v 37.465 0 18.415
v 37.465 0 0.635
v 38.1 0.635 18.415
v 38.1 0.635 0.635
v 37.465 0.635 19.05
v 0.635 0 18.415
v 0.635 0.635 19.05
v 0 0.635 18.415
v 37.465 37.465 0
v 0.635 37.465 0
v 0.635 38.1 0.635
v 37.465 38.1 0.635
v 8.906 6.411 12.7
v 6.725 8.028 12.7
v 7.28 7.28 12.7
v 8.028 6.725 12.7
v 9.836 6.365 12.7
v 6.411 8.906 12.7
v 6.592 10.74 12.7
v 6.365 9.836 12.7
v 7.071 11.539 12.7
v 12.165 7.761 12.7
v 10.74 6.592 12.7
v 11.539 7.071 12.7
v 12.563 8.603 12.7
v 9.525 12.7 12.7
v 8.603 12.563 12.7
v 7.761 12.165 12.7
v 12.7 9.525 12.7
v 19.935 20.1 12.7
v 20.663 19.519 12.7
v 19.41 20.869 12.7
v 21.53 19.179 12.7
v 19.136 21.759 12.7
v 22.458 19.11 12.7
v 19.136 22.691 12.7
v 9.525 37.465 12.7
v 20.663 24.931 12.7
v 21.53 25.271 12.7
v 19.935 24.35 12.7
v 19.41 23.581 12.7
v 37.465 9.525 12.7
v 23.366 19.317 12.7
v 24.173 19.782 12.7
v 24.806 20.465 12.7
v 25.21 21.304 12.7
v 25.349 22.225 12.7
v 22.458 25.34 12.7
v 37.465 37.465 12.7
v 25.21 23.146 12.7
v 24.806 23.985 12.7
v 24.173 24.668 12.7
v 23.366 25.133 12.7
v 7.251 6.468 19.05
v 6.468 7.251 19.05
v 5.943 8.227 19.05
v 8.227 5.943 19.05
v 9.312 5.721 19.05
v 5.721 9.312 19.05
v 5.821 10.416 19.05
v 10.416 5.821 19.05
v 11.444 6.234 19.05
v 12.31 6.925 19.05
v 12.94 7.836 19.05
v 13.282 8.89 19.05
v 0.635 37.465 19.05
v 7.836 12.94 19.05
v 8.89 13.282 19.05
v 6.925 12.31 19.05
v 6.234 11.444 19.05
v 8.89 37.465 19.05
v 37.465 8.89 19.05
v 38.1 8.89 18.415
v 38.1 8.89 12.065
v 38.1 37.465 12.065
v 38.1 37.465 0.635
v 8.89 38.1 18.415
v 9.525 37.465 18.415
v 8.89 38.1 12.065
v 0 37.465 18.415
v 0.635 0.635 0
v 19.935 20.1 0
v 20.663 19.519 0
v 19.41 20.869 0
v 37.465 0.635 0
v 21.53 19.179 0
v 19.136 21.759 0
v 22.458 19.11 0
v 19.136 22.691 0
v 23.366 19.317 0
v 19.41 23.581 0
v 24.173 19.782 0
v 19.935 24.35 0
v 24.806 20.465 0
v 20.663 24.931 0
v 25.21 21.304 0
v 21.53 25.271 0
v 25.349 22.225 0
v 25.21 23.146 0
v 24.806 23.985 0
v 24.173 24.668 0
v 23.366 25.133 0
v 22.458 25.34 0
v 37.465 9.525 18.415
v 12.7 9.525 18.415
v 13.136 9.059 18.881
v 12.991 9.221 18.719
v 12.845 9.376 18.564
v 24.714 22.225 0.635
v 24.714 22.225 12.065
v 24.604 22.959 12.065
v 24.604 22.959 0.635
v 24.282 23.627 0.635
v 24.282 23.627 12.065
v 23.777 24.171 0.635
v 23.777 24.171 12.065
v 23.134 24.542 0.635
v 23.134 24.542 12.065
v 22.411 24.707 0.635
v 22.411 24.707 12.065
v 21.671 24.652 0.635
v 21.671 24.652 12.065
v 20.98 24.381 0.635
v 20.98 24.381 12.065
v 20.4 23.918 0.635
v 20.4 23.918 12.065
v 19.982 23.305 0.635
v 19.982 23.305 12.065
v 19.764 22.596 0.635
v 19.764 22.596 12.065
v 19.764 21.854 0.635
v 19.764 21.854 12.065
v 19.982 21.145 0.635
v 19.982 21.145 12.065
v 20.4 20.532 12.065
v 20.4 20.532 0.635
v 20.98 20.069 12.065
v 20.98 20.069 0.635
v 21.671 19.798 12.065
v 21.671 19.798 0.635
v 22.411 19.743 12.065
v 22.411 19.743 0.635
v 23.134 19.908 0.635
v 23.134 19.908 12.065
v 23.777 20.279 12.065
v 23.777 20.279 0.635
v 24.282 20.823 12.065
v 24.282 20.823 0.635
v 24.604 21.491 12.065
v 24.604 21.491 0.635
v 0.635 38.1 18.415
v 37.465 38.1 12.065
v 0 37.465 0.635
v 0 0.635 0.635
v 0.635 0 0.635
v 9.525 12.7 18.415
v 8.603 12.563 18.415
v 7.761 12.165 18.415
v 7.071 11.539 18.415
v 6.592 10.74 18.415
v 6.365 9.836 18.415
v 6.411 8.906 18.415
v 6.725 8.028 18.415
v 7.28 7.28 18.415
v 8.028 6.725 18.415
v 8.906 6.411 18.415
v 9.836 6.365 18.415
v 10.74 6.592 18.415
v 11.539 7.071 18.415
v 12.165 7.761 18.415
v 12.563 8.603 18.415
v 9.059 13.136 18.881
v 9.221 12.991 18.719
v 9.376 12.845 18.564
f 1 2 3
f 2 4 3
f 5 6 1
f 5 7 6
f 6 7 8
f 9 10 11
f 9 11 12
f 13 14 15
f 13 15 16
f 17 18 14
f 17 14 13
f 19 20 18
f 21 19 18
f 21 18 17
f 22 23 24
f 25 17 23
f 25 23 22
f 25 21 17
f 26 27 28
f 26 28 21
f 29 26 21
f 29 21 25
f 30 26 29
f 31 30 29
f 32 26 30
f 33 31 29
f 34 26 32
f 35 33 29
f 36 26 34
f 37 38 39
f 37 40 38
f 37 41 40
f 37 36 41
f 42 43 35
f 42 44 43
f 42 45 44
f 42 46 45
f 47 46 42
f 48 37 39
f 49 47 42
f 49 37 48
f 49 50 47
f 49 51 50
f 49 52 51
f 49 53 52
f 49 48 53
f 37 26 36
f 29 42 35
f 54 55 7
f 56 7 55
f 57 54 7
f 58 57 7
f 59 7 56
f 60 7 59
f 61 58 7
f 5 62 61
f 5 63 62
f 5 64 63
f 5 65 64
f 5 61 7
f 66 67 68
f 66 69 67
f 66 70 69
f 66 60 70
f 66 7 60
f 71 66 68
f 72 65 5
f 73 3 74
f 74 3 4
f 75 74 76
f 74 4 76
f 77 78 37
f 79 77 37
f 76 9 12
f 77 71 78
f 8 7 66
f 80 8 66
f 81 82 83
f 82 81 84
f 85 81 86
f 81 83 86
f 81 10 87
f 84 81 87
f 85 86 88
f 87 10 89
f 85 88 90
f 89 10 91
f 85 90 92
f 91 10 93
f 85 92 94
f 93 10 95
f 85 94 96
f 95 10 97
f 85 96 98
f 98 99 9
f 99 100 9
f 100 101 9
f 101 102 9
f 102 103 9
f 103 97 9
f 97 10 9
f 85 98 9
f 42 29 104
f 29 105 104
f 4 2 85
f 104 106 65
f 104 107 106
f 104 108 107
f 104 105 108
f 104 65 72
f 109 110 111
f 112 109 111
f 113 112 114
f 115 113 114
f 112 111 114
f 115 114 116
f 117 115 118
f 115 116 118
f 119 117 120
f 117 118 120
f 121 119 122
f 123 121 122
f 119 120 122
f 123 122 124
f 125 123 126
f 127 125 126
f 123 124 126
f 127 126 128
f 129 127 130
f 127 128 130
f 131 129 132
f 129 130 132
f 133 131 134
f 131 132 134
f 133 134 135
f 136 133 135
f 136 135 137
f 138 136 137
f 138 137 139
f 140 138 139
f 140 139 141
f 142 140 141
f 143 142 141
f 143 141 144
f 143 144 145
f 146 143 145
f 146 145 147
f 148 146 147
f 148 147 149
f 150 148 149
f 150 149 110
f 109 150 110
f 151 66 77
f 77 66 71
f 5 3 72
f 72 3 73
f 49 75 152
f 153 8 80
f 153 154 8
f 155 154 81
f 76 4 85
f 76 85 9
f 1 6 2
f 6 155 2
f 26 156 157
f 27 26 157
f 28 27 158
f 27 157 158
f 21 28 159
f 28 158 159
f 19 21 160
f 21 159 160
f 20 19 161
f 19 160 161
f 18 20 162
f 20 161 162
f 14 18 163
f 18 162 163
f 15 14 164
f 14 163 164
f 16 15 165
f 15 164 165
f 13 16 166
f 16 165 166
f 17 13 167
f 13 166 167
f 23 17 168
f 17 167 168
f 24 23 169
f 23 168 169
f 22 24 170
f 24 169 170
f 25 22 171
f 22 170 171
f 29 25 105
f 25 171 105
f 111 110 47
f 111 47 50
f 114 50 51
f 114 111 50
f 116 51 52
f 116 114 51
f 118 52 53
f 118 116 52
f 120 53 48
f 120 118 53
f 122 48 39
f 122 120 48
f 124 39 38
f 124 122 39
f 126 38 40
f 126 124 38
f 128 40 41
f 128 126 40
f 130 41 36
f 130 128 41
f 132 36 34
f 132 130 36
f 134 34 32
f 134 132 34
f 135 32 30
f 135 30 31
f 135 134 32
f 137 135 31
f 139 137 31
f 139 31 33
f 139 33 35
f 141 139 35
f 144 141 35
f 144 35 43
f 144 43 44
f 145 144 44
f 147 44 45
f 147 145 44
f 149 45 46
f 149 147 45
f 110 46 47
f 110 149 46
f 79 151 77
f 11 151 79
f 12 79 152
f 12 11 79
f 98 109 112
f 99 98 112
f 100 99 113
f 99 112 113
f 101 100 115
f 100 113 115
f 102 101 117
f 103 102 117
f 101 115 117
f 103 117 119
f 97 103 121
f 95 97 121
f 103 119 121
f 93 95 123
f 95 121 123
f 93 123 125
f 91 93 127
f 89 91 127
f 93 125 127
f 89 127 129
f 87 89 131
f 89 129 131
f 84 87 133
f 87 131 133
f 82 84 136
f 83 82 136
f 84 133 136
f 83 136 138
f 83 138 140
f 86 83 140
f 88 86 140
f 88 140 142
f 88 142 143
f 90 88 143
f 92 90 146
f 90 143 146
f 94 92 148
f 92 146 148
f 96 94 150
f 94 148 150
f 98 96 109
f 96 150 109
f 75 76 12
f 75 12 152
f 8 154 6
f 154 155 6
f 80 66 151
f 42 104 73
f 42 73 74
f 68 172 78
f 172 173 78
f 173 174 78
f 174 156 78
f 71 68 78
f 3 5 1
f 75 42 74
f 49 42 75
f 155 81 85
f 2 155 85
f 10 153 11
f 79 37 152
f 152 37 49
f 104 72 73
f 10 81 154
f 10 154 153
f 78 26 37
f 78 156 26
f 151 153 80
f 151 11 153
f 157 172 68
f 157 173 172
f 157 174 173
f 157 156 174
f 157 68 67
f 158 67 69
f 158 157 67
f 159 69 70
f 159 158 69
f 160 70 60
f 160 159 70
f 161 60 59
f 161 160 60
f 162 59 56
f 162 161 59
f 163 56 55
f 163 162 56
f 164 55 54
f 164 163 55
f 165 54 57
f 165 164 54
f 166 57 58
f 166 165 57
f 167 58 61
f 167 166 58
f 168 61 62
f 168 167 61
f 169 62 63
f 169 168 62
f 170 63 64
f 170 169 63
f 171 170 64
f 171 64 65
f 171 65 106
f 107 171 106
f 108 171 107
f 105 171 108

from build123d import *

# Parameters (mm, degrees)
F0_W     = 38.1
F0_H     = 38.1
F1_DEPTH = 19.05
F2_W     = 28.575
F2_H     = 28.575
F3_DEPTH = 6.35
F4_R     = 2.4892
F5_DEPTH = 25.4
F6_R     = 3.175
F7_DEPTH = 6.35
F8_SIZE  = 0.635


with BuildPart() as f1:
    # F0 (on Top) → F1 (new body)
    with BuildSketch(Plane.XY):
        with Locations((19.05, 19.05)):
            Rectangle(F0_W, F0_H)
    extrude(amount=F1_DEPTH)

    # F2 (on face) → F3 (cut)
    with BuildSketch(Plane.XY.offset(19.05)):
        with Locations((23.8125, 23.8125)):
            Rectangle(F2_W, F2_H)
    extrude(amount=-F3_DEPTH, mode=Mode.SUBTRACT)

    # F4 (on face) → F5 (cut)
    with BuildSketch(Plane.XY.offset(12.7)):
        with Locations((22.225, 22.225)):
            Circle(F4_R)
    extrude(amount=-F5_DEPTH, mode=Mode.SUBTRACT)

    # F6 (on face) → F7 (cut)
    with BuildSketch(Plane.XY.offset(19.05)):
        with Locations((9.525, 9.525)):
            Circle(F6_R)
    extrude(amount=-F7_DEPTH, mode=Mode.SUBTRACT)

    # F8
    f8_edges = [f1.edges().sort_by_distance(p)[0] for p in [
        (9.525, 25.4, 19.05),
        (7.279936, 7.279936, 19.05),
        (25.4, 9.525, 19.05),
        (38.1, 4.7625, 19.05),
        (19.05, 0, 19.05),
        (0, 19.05, 19.05),
        (4.7625, 38.1, 19.05),
        (0, 38.1, 9.525),
        (0, 0, 9.525),
        (0, 19.05, 0),
        (38.1, 0, 9.525),
        (19.05, 0, 0),
        (19.05, 38.1, 0),
        (38.1, 19.05, 0),
        (19.7358, 22.225, 0),
        (38.1, 38.1, 6.35),
        (38.1, 23.8125, 12.7),
        (38.1, 9.525, 15.875),
        (9.525, 38.1, 15.875),
        (23.8125, 38.1, 12.7),
        (19.7358, 22.225, 12.7),
    ]]
    chamfer(f8_edges, length=F8_SIZE)


solid = f1.part
